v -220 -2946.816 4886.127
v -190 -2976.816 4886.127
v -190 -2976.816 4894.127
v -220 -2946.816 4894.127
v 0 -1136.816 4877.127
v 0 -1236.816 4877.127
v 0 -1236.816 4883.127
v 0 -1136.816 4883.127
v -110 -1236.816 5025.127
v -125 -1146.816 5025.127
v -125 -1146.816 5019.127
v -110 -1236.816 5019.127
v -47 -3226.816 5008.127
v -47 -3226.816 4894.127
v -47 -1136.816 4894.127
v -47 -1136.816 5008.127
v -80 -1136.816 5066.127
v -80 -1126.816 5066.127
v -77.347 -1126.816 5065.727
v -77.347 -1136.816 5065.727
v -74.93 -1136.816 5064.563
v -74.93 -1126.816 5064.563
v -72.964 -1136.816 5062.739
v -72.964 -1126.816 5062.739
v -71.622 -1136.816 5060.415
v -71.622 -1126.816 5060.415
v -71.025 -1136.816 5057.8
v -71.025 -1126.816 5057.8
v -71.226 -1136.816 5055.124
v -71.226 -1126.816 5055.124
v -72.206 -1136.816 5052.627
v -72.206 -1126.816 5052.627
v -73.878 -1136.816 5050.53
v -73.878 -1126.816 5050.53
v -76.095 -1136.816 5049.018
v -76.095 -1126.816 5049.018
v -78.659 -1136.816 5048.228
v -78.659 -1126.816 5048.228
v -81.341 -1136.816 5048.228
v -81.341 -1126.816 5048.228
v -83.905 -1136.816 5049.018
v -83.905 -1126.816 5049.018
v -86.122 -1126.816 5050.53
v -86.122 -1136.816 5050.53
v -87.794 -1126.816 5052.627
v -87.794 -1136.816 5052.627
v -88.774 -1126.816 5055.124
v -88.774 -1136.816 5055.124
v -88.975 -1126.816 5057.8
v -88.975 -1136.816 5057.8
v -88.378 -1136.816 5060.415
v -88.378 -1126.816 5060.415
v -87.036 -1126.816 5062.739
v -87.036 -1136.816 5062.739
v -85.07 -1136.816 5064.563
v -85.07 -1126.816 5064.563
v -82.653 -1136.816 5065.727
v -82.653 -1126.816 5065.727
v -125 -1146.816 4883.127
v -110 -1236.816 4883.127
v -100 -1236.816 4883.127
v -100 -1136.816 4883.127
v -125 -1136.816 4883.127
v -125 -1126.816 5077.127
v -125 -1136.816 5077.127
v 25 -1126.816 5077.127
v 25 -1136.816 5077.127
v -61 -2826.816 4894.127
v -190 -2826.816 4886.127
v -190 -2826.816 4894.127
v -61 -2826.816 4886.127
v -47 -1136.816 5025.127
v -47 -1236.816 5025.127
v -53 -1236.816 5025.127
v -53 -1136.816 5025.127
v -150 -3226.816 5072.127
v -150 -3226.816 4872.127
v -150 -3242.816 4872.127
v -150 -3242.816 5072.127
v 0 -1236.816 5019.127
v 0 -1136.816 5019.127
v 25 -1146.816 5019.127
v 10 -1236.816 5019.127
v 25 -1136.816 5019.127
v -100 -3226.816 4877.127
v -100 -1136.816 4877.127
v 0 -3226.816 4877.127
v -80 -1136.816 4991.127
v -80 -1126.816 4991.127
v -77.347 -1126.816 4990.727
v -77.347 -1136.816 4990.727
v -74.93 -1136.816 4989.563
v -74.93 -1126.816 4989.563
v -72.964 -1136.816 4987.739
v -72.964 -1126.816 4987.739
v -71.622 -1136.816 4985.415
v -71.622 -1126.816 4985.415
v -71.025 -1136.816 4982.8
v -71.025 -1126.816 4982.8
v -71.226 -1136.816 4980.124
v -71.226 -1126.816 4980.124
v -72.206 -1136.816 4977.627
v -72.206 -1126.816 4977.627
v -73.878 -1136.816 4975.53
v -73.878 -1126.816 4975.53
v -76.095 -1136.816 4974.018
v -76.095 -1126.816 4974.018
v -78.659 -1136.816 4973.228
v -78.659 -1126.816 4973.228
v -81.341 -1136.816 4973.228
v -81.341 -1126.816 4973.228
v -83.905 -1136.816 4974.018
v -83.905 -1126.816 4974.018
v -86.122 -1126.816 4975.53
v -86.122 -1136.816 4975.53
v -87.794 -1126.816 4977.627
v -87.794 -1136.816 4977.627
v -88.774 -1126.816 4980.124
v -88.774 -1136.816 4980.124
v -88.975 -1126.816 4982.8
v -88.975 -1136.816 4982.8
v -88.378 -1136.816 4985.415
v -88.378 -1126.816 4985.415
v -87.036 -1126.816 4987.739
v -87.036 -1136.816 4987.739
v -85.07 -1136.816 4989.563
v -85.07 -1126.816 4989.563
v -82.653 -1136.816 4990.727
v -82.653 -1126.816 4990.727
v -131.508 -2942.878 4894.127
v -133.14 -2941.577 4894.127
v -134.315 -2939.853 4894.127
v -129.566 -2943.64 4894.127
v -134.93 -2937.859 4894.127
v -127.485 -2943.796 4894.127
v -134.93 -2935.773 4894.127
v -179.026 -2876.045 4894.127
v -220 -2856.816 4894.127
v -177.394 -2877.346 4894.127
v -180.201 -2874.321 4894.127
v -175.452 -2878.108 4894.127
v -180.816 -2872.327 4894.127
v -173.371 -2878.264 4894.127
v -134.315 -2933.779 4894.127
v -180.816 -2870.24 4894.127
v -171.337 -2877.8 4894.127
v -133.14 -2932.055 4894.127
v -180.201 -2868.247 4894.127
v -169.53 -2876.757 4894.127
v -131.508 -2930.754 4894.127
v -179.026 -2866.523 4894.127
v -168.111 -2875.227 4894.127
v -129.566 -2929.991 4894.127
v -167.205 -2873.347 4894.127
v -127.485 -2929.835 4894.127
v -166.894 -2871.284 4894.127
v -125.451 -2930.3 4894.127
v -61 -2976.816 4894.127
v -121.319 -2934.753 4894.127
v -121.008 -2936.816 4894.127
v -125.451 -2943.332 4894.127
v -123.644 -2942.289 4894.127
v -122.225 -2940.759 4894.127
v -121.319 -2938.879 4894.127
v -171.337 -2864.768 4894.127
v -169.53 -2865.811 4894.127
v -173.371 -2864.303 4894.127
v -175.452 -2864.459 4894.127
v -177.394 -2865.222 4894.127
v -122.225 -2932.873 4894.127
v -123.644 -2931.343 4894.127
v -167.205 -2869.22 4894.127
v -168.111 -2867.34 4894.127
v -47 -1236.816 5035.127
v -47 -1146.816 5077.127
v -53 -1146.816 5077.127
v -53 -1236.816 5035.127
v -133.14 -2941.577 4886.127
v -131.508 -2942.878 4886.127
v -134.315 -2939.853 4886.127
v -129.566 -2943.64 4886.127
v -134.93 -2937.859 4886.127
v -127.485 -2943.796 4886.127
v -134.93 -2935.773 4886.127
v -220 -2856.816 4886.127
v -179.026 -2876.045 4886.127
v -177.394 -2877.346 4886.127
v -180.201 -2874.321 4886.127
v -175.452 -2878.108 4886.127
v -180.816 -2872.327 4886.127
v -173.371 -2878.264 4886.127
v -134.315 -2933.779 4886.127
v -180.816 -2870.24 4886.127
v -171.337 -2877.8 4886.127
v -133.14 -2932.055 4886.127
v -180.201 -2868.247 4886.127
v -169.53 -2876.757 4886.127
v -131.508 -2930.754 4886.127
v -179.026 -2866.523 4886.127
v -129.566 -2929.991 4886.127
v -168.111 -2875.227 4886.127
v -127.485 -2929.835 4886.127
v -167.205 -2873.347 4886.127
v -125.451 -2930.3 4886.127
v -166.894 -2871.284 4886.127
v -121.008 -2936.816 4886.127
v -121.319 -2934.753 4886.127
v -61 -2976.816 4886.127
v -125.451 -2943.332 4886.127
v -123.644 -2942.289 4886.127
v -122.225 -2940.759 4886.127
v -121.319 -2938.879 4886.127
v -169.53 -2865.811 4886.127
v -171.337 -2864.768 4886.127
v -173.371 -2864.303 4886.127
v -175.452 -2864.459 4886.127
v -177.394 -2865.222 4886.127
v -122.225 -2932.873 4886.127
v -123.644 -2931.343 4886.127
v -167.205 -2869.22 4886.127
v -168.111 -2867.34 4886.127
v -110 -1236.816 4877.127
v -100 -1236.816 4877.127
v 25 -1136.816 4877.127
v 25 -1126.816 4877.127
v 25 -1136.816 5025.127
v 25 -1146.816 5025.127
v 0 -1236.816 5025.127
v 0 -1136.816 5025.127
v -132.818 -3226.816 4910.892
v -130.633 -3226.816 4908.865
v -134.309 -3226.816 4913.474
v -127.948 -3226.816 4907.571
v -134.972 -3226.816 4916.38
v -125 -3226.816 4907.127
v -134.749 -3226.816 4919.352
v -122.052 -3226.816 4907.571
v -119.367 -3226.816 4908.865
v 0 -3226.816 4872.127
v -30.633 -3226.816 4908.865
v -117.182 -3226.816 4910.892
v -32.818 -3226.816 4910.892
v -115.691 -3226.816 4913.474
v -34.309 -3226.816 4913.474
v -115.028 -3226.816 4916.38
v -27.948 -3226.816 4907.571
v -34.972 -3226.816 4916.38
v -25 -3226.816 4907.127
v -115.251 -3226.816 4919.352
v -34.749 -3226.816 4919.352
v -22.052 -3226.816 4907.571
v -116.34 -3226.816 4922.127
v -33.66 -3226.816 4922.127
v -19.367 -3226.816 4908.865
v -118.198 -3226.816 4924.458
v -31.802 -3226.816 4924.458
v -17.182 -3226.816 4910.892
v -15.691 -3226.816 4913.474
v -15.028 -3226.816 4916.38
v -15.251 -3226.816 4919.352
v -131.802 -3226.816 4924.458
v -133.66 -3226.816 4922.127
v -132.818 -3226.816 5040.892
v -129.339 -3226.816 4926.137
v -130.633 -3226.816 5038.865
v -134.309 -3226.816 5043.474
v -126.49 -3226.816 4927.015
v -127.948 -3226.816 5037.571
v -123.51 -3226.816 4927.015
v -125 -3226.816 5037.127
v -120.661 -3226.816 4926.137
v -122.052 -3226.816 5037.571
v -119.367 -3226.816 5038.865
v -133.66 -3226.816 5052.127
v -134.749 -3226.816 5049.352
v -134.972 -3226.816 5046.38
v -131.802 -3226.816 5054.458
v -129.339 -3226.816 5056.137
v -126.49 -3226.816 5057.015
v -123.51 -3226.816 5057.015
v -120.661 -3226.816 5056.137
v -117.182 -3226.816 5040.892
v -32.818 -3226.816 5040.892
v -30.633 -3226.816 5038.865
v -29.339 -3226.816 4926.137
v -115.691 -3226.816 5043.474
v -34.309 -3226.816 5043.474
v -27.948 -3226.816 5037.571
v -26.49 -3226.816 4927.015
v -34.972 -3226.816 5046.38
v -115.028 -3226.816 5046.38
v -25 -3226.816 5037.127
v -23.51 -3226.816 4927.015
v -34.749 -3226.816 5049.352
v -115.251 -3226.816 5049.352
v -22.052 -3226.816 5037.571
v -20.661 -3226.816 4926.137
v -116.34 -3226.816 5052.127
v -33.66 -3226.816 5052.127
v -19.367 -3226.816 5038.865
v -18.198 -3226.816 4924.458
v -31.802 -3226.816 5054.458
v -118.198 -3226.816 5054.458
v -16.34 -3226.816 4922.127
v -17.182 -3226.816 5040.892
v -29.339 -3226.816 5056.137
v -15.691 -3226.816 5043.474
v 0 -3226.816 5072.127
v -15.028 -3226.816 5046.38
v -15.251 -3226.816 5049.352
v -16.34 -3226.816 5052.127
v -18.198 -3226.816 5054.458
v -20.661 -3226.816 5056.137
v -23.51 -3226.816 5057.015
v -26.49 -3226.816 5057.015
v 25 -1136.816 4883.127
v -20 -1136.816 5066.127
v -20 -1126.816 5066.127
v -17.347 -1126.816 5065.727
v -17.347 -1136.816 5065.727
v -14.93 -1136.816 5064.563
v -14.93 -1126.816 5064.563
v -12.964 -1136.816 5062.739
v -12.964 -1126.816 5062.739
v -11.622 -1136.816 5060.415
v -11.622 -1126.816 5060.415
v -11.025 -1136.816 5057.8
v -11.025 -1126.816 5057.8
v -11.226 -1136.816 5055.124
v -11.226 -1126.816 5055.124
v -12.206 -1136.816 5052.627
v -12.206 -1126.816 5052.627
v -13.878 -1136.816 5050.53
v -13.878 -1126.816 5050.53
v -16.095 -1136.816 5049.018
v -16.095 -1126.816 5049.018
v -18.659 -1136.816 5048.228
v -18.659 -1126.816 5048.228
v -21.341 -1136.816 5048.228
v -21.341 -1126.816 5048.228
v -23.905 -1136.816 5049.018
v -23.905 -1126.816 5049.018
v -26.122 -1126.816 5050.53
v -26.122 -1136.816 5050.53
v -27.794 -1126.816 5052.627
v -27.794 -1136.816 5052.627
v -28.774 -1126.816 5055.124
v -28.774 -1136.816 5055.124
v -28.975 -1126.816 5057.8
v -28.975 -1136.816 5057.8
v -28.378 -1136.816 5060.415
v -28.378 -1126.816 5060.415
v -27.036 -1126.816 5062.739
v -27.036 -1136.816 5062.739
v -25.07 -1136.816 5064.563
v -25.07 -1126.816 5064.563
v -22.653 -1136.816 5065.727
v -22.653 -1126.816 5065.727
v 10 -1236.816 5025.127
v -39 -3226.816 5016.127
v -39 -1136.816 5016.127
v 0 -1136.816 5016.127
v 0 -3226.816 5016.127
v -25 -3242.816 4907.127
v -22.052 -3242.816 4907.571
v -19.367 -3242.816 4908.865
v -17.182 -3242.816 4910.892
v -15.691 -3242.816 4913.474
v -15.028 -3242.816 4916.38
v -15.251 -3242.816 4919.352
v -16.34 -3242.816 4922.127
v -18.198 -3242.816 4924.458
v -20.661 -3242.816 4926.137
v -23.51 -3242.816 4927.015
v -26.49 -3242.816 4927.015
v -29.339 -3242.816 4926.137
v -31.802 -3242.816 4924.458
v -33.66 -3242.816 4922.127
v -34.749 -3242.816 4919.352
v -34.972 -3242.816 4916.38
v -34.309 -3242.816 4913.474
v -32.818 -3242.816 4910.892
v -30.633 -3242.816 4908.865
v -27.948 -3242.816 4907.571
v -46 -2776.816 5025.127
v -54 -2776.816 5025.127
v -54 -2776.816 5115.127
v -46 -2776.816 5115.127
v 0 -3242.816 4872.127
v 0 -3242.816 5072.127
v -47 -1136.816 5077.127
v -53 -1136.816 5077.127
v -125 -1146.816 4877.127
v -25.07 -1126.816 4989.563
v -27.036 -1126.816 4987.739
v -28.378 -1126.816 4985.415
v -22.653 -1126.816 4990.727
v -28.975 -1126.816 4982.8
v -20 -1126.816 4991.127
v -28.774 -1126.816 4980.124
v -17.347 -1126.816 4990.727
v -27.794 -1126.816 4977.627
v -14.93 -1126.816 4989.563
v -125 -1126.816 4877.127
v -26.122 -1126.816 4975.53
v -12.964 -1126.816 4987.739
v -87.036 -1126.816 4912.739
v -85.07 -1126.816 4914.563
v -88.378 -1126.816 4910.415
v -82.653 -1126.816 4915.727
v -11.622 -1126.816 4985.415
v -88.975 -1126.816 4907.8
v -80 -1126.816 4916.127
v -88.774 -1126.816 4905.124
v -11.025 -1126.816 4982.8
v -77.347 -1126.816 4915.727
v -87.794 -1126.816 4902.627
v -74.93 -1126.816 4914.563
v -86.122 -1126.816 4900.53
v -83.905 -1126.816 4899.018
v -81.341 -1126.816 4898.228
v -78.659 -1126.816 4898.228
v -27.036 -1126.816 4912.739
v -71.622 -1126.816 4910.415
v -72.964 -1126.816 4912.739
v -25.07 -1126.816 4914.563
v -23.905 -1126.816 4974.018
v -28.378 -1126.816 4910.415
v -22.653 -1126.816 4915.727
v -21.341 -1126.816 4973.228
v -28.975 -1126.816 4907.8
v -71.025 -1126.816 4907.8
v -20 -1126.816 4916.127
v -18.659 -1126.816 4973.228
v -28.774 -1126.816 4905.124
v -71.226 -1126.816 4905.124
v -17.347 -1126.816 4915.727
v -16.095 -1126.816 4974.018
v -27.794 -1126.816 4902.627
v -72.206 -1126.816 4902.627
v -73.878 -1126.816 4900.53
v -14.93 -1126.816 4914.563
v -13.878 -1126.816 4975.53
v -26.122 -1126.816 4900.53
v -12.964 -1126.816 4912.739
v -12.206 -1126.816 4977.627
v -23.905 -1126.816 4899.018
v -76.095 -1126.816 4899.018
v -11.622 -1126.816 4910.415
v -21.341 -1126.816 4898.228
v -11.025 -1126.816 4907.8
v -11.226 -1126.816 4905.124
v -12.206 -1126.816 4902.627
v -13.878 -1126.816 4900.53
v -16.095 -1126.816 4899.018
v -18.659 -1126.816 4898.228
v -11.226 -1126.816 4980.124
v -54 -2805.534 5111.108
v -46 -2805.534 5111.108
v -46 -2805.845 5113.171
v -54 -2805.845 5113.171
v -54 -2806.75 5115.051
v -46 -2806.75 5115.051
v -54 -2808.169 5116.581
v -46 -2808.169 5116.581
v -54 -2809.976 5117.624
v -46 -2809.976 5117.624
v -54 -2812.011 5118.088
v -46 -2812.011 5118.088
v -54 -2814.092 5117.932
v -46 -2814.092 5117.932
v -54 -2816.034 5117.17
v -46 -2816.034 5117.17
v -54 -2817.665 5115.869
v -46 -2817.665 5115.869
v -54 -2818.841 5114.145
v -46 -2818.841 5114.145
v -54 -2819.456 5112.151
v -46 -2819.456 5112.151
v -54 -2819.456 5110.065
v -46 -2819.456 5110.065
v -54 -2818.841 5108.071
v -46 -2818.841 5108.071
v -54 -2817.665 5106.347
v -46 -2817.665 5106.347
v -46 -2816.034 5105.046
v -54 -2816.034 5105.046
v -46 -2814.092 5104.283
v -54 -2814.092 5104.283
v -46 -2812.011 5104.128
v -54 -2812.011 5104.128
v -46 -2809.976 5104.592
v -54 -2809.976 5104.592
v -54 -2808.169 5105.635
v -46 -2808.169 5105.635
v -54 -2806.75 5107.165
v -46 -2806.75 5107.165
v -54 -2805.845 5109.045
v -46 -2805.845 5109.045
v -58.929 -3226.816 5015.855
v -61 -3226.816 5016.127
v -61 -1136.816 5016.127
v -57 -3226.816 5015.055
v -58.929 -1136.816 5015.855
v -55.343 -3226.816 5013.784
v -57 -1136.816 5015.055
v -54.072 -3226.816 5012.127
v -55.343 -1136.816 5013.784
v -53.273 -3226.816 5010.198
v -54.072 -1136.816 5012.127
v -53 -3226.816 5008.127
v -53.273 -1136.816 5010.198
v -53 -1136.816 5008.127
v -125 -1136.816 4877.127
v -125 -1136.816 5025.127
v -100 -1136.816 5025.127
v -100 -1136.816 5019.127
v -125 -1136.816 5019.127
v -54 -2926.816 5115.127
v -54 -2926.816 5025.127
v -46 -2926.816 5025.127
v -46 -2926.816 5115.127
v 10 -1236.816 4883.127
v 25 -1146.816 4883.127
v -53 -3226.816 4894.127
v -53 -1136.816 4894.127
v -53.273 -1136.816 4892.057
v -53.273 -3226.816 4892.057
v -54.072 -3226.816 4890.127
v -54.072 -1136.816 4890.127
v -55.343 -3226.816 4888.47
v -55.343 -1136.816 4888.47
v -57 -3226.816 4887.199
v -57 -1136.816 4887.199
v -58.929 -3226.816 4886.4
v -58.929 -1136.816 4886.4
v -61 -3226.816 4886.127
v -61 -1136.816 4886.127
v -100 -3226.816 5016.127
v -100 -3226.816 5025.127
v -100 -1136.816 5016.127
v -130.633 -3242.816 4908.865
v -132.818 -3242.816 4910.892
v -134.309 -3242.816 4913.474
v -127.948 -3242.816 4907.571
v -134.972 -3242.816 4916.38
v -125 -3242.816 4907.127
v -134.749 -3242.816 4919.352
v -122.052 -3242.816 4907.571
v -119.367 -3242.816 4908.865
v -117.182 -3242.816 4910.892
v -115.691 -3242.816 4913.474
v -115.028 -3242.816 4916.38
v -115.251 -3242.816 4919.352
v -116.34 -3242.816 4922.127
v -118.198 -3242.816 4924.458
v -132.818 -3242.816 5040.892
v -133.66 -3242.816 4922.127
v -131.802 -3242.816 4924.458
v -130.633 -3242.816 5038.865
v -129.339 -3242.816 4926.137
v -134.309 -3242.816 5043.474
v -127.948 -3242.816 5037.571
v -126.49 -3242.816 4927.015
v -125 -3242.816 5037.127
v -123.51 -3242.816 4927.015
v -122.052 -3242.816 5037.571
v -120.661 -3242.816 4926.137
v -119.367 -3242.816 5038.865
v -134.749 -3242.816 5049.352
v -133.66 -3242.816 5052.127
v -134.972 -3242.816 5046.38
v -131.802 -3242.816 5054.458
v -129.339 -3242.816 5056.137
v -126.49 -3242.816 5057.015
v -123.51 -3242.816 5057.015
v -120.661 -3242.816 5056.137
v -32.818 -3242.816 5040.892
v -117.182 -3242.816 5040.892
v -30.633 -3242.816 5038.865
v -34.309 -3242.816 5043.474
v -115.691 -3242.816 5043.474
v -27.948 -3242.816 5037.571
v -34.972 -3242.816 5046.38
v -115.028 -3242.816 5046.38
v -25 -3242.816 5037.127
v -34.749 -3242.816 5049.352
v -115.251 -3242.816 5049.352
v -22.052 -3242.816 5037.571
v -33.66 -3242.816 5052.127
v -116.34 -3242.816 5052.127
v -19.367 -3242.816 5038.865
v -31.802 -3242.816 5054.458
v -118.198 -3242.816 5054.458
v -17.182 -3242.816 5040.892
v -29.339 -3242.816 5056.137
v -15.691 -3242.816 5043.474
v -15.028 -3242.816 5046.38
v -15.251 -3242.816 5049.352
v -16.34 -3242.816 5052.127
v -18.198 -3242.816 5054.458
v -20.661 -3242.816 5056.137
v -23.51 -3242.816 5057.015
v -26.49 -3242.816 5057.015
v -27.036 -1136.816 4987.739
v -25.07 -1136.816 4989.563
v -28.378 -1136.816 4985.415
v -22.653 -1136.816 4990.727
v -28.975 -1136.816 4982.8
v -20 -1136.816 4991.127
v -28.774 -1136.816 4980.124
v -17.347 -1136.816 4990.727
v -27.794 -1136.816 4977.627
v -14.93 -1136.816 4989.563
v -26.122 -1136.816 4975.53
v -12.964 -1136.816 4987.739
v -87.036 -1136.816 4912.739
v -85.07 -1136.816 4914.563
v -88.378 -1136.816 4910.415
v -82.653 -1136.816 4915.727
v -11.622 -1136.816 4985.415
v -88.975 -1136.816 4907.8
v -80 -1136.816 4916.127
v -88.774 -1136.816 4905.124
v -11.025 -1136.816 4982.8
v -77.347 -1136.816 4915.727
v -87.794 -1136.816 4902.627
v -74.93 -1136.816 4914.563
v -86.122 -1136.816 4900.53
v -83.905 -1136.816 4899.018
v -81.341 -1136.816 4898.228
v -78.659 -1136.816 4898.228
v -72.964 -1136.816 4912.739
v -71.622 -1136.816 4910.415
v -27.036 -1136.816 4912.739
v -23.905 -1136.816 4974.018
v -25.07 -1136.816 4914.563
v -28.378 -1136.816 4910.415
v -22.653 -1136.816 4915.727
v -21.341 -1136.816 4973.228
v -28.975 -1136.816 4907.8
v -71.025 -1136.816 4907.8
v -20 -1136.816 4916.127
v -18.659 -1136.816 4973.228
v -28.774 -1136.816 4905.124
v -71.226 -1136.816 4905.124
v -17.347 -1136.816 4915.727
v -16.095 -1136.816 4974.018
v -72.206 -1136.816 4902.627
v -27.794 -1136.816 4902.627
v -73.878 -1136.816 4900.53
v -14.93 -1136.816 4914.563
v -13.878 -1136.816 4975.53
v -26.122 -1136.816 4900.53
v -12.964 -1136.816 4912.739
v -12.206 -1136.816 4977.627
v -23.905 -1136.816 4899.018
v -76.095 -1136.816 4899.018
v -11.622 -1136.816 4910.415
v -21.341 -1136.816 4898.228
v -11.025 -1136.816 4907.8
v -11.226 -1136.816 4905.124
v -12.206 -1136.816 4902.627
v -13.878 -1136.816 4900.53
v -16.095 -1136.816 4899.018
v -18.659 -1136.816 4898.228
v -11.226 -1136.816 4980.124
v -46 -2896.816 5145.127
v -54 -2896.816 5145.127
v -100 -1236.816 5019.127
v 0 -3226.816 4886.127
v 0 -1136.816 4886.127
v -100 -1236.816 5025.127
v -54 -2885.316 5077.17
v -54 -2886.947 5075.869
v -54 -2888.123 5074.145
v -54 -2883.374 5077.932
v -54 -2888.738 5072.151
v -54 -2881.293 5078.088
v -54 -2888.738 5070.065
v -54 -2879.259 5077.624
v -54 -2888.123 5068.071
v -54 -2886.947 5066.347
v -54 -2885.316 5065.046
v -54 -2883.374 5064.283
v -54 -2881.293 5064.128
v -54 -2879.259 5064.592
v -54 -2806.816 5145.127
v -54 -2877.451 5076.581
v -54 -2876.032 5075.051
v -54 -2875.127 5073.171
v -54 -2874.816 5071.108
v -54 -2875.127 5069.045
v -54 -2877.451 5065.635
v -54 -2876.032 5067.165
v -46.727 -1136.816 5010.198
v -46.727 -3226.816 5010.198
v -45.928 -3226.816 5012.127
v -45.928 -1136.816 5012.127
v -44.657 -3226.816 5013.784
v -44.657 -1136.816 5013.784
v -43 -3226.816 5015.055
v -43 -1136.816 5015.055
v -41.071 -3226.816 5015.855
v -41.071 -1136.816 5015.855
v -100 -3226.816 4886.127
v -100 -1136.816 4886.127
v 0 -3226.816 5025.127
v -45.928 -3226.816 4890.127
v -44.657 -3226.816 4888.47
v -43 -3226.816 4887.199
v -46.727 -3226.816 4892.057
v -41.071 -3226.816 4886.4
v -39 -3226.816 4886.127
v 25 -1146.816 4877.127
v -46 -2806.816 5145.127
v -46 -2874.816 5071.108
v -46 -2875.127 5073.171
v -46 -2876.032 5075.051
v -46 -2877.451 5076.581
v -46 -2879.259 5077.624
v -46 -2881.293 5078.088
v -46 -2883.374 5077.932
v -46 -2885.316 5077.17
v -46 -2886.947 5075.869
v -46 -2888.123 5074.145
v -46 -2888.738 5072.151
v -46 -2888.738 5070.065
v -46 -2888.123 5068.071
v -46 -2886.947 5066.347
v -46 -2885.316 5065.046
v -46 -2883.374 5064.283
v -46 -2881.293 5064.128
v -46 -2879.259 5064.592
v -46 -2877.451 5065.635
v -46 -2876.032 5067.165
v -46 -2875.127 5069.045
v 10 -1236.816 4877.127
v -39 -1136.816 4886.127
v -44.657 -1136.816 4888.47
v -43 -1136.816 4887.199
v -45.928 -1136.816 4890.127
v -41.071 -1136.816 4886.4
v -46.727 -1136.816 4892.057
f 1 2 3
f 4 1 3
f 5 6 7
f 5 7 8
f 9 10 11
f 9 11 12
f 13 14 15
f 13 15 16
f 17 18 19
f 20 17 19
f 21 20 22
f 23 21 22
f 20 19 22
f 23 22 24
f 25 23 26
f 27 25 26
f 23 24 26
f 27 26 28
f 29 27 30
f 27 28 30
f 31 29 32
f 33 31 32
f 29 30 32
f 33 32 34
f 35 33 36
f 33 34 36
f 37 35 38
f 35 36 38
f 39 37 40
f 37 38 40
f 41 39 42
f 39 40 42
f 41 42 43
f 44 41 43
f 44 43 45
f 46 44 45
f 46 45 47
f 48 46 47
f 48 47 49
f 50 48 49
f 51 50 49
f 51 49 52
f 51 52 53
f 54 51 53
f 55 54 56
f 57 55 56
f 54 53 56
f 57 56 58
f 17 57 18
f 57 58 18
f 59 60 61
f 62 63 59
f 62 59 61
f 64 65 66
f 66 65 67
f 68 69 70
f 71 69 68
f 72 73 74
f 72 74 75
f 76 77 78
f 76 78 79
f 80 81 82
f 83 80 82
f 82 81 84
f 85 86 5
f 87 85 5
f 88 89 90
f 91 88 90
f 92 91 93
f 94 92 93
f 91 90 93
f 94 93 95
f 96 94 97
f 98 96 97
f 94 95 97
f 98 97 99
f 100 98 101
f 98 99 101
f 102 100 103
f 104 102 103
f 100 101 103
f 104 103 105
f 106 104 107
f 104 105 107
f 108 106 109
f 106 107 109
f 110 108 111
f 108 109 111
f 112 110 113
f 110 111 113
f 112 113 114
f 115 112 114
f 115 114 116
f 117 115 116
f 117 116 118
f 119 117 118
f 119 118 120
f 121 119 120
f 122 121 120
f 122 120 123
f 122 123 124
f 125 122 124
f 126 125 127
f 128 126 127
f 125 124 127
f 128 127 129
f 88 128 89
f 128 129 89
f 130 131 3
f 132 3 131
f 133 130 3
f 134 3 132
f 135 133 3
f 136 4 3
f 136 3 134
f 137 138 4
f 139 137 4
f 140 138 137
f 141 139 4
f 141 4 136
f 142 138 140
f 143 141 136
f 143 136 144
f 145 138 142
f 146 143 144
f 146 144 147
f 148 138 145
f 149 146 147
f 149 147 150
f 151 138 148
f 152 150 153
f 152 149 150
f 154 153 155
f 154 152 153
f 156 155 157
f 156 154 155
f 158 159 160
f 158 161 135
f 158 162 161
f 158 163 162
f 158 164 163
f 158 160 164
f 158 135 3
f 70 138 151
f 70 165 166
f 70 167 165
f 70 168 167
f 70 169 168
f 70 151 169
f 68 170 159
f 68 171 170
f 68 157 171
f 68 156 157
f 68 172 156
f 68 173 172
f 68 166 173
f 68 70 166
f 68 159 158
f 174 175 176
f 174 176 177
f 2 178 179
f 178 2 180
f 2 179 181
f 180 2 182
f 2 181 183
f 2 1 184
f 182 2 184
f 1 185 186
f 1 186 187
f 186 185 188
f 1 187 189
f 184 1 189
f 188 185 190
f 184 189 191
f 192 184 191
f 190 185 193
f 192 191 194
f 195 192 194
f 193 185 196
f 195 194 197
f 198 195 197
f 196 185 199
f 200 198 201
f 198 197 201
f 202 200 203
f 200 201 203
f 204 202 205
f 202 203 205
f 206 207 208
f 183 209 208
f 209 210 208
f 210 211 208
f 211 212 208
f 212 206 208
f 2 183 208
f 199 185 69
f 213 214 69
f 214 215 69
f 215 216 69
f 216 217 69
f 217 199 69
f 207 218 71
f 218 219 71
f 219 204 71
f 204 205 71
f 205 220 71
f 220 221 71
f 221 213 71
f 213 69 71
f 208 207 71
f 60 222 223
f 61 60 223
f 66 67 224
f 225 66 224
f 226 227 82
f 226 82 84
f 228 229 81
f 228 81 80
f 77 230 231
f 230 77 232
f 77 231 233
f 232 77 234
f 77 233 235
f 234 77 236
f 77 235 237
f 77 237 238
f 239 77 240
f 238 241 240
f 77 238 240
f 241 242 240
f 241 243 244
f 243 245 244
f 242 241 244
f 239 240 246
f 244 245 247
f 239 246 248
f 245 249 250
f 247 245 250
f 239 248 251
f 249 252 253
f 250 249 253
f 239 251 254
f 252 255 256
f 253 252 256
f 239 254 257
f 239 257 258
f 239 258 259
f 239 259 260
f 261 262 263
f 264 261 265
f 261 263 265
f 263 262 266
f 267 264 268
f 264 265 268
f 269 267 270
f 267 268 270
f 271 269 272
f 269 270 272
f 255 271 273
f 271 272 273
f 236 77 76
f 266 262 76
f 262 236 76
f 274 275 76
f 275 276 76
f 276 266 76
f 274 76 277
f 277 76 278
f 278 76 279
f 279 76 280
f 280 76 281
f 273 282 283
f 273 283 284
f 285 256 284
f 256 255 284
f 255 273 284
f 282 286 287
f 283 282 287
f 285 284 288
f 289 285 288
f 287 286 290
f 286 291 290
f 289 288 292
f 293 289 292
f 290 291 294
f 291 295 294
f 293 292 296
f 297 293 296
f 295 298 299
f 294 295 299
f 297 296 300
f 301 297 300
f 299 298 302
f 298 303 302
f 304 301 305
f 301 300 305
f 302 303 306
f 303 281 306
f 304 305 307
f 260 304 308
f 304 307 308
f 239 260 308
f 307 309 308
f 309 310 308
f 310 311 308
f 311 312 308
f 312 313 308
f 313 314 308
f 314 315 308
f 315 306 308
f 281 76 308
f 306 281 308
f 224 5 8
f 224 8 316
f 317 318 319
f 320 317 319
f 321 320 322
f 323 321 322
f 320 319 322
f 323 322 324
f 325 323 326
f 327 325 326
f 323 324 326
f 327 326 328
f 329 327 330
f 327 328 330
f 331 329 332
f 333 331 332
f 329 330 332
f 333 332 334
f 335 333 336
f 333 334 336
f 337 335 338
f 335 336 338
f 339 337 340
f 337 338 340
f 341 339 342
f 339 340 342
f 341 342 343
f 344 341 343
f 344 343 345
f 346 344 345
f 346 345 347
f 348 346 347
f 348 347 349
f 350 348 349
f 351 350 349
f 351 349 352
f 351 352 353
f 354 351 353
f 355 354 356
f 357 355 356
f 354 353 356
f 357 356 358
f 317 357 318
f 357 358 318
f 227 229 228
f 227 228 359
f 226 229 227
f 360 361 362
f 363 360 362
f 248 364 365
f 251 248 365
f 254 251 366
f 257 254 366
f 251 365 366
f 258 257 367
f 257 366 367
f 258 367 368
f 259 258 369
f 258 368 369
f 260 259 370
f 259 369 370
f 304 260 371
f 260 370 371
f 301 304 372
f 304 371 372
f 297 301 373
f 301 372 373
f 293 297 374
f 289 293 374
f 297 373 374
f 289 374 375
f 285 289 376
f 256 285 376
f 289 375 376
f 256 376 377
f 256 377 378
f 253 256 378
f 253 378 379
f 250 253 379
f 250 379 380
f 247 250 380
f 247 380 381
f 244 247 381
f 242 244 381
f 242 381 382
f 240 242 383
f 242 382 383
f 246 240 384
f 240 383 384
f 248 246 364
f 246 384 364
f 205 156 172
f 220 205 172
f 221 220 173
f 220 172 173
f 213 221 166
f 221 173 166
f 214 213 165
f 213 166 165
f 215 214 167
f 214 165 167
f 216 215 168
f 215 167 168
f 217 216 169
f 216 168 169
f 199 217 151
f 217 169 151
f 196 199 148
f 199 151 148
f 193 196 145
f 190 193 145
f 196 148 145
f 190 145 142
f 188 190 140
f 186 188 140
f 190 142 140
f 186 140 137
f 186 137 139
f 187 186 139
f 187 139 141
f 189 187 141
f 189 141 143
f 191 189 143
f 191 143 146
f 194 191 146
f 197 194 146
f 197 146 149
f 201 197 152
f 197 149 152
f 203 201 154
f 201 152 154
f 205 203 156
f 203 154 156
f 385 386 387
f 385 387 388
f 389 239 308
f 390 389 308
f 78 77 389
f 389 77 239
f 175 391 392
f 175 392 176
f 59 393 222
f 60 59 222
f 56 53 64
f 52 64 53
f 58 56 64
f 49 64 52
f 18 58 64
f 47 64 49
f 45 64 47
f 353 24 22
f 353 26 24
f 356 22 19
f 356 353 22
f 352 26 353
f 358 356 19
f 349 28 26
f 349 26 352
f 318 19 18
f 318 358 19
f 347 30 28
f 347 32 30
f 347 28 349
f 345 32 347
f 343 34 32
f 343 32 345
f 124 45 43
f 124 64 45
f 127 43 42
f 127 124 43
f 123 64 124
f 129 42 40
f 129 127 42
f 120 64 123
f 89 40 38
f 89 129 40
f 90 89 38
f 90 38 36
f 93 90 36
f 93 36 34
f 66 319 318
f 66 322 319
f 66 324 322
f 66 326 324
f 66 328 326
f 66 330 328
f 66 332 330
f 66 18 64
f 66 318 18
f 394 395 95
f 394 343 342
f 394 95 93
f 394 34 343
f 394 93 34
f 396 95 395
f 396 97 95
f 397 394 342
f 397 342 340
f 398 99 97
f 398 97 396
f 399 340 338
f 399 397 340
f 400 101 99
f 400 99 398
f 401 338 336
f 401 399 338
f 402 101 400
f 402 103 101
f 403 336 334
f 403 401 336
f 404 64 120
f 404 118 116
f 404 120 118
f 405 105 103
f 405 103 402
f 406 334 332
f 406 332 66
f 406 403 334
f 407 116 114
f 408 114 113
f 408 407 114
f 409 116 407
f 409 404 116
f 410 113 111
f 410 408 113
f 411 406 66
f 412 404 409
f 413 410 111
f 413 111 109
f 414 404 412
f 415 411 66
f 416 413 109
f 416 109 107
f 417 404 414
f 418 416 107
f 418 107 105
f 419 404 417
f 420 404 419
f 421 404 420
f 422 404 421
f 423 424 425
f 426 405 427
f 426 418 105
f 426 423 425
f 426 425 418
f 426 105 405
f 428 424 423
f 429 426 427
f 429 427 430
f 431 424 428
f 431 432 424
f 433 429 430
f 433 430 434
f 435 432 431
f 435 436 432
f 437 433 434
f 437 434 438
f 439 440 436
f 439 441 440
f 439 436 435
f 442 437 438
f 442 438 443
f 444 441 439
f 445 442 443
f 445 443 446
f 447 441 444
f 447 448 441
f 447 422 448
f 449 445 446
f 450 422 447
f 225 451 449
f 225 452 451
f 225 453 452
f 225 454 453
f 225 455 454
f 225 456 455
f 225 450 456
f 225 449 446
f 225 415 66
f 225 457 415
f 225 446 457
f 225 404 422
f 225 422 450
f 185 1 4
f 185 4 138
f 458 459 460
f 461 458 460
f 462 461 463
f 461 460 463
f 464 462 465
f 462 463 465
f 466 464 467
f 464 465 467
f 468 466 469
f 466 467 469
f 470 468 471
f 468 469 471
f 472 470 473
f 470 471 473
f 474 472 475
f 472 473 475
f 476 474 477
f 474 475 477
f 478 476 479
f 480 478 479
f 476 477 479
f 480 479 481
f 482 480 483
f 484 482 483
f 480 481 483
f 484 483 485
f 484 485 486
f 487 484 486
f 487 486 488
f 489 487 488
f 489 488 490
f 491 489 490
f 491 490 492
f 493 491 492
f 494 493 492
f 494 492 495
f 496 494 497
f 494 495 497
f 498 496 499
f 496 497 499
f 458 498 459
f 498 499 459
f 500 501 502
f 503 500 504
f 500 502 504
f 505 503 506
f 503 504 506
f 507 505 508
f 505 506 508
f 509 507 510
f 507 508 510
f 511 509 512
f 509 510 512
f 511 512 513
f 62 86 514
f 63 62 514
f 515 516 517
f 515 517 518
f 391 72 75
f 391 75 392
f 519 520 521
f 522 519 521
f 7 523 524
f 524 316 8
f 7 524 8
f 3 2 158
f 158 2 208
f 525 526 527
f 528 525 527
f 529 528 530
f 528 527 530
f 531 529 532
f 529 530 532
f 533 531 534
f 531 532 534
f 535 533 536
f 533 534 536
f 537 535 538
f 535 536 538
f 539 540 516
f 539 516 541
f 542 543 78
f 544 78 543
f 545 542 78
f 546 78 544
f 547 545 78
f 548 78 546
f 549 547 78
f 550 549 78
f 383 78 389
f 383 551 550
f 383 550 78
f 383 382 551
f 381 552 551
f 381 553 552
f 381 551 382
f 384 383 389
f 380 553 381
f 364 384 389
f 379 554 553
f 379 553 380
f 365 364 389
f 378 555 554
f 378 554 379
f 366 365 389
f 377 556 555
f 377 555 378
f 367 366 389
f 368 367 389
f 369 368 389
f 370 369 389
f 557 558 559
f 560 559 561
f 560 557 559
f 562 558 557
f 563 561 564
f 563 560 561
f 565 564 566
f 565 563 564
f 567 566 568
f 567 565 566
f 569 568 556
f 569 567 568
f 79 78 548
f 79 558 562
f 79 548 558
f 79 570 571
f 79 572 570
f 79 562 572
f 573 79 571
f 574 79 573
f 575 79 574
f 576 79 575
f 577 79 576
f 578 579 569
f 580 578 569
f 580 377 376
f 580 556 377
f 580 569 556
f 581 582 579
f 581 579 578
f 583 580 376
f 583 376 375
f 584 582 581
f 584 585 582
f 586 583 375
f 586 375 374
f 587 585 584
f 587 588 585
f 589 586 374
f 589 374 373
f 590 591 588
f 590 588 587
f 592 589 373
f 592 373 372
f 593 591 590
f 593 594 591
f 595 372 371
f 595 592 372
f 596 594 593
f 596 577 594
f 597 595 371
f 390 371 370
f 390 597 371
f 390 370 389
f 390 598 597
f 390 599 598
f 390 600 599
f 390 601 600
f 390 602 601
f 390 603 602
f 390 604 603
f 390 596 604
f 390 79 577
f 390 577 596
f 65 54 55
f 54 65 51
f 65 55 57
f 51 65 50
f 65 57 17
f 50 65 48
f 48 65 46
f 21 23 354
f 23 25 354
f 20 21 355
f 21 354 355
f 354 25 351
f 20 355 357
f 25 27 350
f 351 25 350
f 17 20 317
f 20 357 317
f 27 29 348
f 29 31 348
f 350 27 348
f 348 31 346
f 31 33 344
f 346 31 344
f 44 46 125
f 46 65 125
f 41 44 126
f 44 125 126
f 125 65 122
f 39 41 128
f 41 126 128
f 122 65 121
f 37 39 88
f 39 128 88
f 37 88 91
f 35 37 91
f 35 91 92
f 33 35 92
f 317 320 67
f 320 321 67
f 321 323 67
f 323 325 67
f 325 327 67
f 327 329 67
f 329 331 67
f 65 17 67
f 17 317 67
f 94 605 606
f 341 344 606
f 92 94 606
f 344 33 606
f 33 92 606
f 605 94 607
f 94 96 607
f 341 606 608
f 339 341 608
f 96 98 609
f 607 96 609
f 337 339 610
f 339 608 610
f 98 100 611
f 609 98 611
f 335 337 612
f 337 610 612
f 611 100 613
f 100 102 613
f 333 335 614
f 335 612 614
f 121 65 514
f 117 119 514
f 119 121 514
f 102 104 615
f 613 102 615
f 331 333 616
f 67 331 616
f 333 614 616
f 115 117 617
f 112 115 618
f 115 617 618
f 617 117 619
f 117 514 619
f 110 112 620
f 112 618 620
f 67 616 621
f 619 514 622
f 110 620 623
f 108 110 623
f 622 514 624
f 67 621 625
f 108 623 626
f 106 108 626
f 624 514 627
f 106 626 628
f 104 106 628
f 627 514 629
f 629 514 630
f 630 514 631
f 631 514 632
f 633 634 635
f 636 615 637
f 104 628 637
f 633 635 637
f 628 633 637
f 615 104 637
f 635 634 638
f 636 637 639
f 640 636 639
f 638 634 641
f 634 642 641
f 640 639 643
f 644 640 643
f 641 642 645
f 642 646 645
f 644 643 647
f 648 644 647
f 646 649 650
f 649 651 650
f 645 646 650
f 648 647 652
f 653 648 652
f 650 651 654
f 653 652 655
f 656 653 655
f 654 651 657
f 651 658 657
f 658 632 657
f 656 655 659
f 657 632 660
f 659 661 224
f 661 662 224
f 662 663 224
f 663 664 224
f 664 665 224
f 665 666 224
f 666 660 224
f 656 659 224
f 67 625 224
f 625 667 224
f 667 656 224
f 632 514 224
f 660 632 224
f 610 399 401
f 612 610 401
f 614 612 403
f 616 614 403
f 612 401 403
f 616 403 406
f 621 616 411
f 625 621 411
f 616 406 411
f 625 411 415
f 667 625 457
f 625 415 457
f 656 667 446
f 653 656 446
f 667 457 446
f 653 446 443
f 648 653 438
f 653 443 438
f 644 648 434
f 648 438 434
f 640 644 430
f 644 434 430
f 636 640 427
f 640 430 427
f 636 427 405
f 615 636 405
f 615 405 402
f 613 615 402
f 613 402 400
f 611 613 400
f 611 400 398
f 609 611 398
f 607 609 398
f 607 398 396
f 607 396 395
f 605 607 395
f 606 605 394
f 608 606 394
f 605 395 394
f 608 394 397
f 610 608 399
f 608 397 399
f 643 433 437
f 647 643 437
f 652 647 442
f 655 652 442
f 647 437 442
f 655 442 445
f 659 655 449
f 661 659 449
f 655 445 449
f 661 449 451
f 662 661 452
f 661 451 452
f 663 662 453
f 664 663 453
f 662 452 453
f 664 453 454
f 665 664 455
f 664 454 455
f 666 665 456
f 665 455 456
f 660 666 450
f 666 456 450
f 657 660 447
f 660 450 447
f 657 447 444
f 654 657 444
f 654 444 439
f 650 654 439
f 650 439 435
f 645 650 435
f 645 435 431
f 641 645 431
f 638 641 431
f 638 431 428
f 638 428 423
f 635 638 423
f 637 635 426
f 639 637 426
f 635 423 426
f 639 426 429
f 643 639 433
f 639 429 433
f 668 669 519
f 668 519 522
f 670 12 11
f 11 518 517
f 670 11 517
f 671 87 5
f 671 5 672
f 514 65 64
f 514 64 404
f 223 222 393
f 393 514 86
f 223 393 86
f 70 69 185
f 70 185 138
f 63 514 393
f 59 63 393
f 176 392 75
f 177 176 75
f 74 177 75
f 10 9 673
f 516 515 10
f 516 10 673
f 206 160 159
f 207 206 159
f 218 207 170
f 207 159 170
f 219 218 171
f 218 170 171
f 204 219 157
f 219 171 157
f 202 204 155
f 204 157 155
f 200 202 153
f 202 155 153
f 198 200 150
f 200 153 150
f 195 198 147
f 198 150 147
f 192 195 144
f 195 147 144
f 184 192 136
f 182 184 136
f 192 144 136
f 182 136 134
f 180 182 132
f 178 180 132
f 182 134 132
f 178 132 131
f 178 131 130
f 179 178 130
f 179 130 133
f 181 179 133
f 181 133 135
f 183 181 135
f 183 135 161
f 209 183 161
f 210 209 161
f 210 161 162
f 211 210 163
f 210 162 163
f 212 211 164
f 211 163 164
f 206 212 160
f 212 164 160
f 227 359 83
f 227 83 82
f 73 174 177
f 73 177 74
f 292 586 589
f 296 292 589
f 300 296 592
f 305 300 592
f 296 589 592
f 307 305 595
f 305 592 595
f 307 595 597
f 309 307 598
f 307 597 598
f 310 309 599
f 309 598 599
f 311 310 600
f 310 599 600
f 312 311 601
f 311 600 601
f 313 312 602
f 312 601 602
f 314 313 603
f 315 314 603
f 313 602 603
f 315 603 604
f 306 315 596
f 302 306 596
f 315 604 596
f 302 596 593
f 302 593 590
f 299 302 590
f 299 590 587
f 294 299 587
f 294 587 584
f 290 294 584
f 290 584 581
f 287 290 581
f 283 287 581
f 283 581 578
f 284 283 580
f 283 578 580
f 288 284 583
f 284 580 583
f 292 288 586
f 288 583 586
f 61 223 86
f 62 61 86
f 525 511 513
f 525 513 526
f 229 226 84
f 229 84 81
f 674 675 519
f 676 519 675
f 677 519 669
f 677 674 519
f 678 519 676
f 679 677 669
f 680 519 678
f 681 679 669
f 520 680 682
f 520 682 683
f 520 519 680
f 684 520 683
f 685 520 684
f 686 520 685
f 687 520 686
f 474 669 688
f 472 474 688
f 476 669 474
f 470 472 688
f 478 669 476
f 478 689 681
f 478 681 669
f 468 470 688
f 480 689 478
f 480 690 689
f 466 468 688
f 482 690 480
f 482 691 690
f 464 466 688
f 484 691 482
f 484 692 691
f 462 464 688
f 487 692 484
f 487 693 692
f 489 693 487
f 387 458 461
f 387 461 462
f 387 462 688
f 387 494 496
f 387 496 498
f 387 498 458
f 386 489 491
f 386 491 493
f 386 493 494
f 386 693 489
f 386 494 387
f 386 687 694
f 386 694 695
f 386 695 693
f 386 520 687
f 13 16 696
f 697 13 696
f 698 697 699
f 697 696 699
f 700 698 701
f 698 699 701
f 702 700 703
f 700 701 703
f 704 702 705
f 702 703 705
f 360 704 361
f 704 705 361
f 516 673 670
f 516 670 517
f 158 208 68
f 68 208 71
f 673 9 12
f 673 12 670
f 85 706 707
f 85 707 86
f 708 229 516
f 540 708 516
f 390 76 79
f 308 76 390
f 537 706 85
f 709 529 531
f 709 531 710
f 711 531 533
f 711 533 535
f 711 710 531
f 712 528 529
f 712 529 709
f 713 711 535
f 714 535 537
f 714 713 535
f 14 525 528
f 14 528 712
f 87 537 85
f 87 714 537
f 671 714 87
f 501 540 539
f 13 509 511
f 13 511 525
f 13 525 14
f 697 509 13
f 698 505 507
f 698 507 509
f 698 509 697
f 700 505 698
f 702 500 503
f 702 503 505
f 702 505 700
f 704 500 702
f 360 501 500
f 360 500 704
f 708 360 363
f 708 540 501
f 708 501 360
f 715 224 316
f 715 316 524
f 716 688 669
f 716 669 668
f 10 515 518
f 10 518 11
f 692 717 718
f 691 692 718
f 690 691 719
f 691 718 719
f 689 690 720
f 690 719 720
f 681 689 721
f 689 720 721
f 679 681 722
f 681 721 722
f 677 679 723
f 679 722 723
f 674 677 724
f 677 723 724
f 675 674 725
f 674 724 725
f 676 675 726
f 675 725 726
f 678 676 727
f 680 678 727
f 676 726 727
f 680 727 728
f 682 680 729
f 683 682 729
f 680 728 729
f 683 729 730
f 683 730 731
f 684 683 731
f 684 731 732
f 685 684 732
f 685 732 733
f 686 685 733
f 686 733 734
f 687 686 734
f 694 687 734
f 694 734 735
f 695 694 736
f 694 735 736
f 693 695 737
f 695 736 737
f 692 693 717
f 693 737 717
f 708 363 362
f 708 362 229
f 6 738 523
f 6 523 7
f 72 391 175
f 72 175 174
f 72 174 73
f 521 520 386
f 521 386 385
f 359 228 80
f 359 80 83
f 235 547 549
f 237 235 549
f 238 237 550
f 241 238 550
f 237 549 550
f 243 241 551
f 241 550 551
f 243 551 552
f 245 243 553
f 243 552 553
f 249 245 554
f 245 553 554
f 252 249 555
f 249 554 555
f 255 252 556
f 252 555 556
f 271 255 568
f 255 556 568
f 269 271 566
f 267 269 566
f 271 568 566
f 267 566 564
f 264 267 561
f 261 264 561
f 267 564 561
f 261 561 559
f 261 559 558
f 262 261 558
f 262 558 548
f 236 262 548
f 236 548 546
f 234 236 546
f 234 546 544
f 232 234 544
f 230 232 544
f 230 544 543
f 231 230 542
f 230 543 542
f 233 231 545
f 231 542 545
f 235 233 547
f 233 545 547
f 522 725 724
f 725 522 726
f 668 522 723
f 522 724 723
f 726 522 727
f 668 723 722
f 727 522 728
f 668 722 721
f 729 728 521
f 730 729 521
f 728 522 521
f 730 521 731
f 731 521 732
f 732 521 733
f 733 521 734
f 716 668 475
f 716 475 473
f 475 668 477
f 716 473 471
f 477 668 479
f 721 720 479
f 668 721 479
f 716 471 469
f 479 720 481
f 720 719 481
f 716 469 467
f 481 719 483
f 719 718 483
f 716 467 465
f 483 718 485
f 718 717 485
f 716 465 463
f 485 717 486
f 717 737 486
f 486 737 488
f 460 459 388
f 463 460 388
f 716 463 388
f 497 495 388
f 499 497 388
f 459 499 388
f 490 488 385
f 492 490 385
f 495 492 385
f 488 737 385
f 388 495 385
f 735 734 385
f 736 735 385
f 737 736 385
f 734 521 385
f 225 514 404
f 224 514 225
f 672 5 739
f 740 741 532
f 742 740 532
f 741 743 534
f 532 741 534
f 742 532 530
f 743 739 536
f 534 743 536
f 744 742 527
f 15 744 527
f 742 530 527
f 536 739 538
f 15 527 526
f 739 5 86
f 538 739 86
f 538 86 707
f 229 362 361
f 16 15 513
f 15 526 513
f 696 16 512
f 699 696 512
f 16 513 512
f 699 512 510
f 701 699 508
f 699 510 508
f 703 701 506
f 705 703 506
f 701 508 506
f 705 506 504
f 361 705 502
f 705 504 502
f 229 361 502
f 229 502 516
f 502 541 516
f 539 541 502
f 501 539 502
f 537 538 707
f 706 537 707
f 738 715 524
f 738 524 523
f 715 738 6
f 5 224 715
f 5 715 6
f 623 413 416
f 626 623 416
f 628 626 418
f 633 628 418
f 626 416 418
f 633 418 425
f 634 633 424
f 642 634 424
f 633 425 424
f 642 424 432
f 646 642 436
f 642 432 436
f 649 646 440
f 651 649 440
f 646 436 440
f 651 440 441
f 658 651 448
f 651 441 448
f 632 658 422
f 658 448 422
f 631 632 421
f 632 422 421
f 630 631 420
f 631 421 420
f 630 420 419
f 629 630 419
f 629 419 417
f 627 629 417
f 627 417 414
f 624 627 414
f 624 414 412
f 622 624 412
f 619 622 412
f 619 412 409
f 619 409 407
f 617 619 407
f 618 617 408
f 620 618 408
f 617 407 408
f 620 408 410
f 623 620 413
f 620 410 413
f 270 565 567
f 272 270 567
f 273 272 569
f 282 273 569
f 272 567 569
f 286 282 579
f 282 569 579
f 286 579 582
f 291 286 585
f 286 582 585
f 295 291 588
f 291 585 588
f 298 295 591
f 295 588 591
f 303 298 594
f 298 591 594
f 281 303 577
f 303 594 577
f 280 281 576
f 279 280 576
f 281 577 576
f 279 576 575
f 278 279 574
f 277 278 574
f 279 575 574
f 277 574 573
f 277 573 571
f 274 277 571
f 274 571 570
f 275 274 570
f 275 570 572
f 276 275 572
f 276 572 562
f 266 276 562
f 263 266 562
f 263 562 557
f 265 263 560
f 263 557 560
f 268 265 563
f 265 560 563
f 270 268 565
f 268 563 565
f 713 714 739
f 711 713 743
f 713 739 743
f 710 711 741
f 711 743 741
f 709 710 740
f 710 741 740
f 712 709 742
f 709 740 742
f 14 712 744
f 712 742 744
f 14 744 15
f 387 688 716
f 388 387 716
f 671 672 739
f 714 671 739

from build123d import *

# Parameters (mm, degrees)
H_HM150_100_1_DEPTH = 2100
SKETCH_12_W         = 150
SKETCH_12_H         = 200
EXTRUDE_1_DEPTH     = 16
SKETCH_13_W         = 148
SKETCH_13_H         = 10
CUT_EXTRUDE_1_DEPTH = 100
SKETCH_14_W         = 150
SKETCH_14_H         = 200
EXTRUDE_2_DEPTH     = 10
SKETCH_16_R         = 9
CUT_EXTRUDE_2_DEPTH = 10
EXTRUDE_3_DEPTH     = 6
EXTRUDE_3_2_DEPTH   = 6
EXTRUDE_4_DEPTH     = 6
EXTRUDE_4_2_DEPTH   = 6
EXTRUDE_5_DEPTH     = 6
SKETCH_20_W         = 8
SKETCH_20_H         = 150
EXTRUDE_6_DEPTH     = 120
CHAMFER_1_SIZE      = 30
SKETCH_21_R         = 7
CUT_EXTRUDE_3_DEPTH = 8
SKETCH_22_W         = 159
SKETCH_22_H         = 150
EXTRUDE_7_DEPTH     = 8
CHAMFER_2_SIZE      = 30
SKETCH_23_R         = 7
CUT_EXTRUDE_4_DEPTH = 8
SKETCH_24_R         = 10
CUT_EXTRUDE_5_DEPTH = 16


with BuildPart() as part:
    # 草图11 → H型钢 HM150×100(1) (new body)
    with BuildSketch(Plane(origin=(-50, -1126.815903712, 4951.12717578), x_dir=(1, 0, 0), z_dir=(0, -1, 0))):
        with BuildLine():
            Line((-50, -74), (50, -74))
            Line((50, -74), (50, -65))
            Line((50, -65), (11, -65))
            ThreePointArc((11, -65), (5.343145751, -62.656854249), (3, -57))
            Line((3, -57), (3, 57))
            ThreePointArc((3, 57), (5.343145751, 62.656854249), (11, 65))
            Line((11, 65), (50, 65))
            Line((50, 65), (50, 74))
            Line((50, 74), (-50, 74))
            Line((-50, 74), (-50, 65))
            Line((-50, 65), (-11, 65))
            ThreePointArc((-11, 65), (-5.343145751, 62.656854249), (-3, 57))
            Line((-3, 57), (-3, -57))
            ThreePointArc((-3, -57), (-5.343145751, -62.656854249), (-11, -65))
            Line((-11, -65), (-50, -65))
            Line((-50, -65), (-50, -74))
        make_face()
    extrude(amount=H_HM150_100_1_DEPTH)

    # 草图13 → 切除-拉伸1 (cut)
    with BuildSketch(Plane.ZY.offset(100)):
        with Locations((4951.12717578, -1131.815903712)):
            Rectangle(SKETCH_13_W, SKETCH_13_H)
    extrude(amount=-CUT_EXTRUDE_1_DEPTH, mode=Mode.SUBTRACT)


with BuildPart() as body_2:
    # 草图12 → 凸台-拉伸1 (new body)
    with BuildSketch(Plane.XZ.offset(3226.815903712)):
        with Locations((-75, 4972.12717578)):
            Rectangle(SKETCH_12_W, SKETCH_12_H)
    extrude(amount=EXTRUDE_1_DEPTH)

    # 草图24 → 切除-拉伸5 (cut)
    with BuildSketch(Plane.XZ.offset(3242.815903712)):
        with Locations(Location((-125, 5047.12717578, 0), (0, 0, 270))):
            Circle(SKETCH_24_R)
        with Locations(Location((-25, 5047.12717578, 0), (0, 0, 270))):
            Circle(SKETCH_24_R)
        with Locations(Location((-125, 4917.12717578, 0), (0, 0, 270))):
            Circle(SKETCH_24_R)
        with Locations(Location((-25, 4917.12717578, 0), (0, 0, 270))):
            Circle(SKETCH_24_R)
    extrude(amount=-CUT_EXTRUDE_5_DEPTH, mode=Mode.SUBTRACT)


with BuildPart() as body_3:
    # 草图14 → 凸台-拉伸2 (new body)
    with BuildSketch(Plane(origin=(0, -1136.815903712, 0), x_dir=(1, 0, 0), z_dir=(0, 1, 0))):
        with Locations((-50, -4977.12717578)):
            Rectangle(SKETCH_14_W, SKETCH_14_H)
    extrude(amount=EXTRUDE_2_DEPTH)

    # 草图16 → 切除-拉伸2 (cut)
    with BuildSketch(Plane(origin=(0, -1126.815903712, 0), x_dir=(1, 0, 0), z_dir=(0, 1, 0))):
        with Locations(Location((-20, -4907.12717578, 0), (0, 0, 270))):
            Circle(SKETCH_16_R)
        with Locations(Location((-20, -4982.12717578, 0), (0, 0, 270))):
            Circle(SKETCH_16_R)
        with Locations(Location((-20, -5057.12717578, 0), (0, 0, 270))):
            Circle(SKETCH_16_R)
        with Locations(Location((-80, -4907.12717578, 0), (0, 0, 270))):
            Circle(SKETCH_16_R)
        with Locations(Location((-80, -4982.12717578, 0), (0, 0, 270))):
            Circle(SKETCH_16_R)
        with Locations(Location((-80, -5057.12717578, 0), (0, 0, 270))):
            Circle(SKETCH_16_R)
    extrude(amount=-CUT_EXTRUDE_2_DEPTH, mode=Mode.SUBTRACT)


with BuildPart() as body_4:
    # 草图17 → 凸台-拉伸3 (new body)
    with BuildSketch(Plane(origin=(0, 0, 4877.12717578), x_dir=(-1, 0, 0), z_dir=(0, 0, -1))):
        Polygon((0, -1136.815903712), (-25, -1136.815903712), (-25, -1146.815903712), (-10, -1236.815903712), (0, -1236.815903712), align=None)
    extrude(amount=-EXTRUDE_3_DEPTH)


with BuildPart() as body_5:
    # 草图17 → Extrude 3 2 (new body)
    with BuildSketch(Plane(origin=(0, 0, 4877.12717578), x_dir=(-1, 0, 0), z_dir=(0, 0, -1))):
        Polygon((100, -1136.815903712), (125, -1136.815903712), (125, -1146.815903712), (110, -1236.815903712), (100, -1236.815903712), align=None)
    extrude(amount=-EXTRUDE_3_2_DEPTH)


with BuildPart() as body_6:
    # 草图18 → 凸台-拉伸4 (new body)
    with BuildSketch(Plane.XY.offset(5025.12717578)):
        Polygon((-100, -1236.815903712), (-100, -1136.815903712), (-125, -1136.815903712), (-125, -1146.815903712), (-110, -1236.815903712), align=None)
    extrude(amount=-EXTRUDE_4_DEPTH)


with BuildPart() as body_7:
    # 草图18 → Extrude 4 2 (new body)
    with BuildSketch(Plane.XY.offset(5025.12717578)):
        Polygon((0, -1136.815903712), (0, -1236.815903712), (10, -1236.815903712), (25, -1146.815903712), (25, -1136.815903712), align=None)
    extrude(amount=-EXTRUDE_4_2_DEPTH)


with BuildPart() as body_8:
    # 草图19 → 凸台-拉伸5 (new body)
    with BuildSketch(Plane(origin=(-47, 0, 0), x_dir=(0, 0, -1), z_dir=(1, 0, 0))):
        Polygon((-5025.12717578, -1136.815903712), (-5077.12717578, -1136.815903712), (-5077.12717578, -1146.815903712), (-5035.12717578, -1236.815903712), (-5025.12717578, -1236.815903712), align=None)
    extrude(amount=-EXTRUDE_5_DEPTH)


with BuildPart() as body_9:
    # 草图20 → 凸台-拉伸6 (new body)
    with BuildSketch(Plane.XY.offset(5025.12717578)):
        with Locations((-50, -2851.815903712)):
            Rectangle(SKETCH_20_W, SKETCH_20_H)
    extrude(amount=EXTRUDE_6_DEPTH)

    # 倒角1
    chamfer_1_edges = [body_9.edges().sort_by_distance(p)[0] for p in [
        (-50, -2776.815903712, 5145.12717578),
        (-50, -2926.815903712, 5145.12717578),
    ]]
    chamfer(chamfer_1_edges, length=CHAMFER_1_SIZE)

    # 草图21 → 切除-拉伸3 (cut)
    with BuildSketch(Plane(origin=(-46, 0, 0), x_dir=(0, 0, -1), z_dir=(1, 0, 0))):
        with Locations(Location((-5071.107937894, -2881.815903712, 0), (0, 0, 90))):
            Circle(SKETCH_21_R)
        with Locations(Location((-5111.107937894, -2812.533871409, 0), (0, 0, 90))):
            Circle(SKETCH_21_R)
    extrude(amount=-CUT_EXTRUDE_3_DEPTH, mode=Mode.SUBTRACT)


with BuildPart() as body_10:
    # 草图22 → 凸台-拉伸7 (new body)
    with BuildSketch(Plane.XY.offset(4886.12717578)):
        with Locations((-140.5, -2901.815903712)):
            Rectangle(SKETCH_22_W, SKETCH_22_H)
    extrude(amount=EXTRUDE_7_DEPTH)

    # 倒角2
    chamfer_2_edges = [body_10.edges().sort_by_distance(p)[0] for p in [
        (-220, -2976.815903712, 4890.12717578),
        (-220, -2826.815903712, 4890.12717578),
    ]]
    chamfer(chamfer_2_edges, length=CHAMFER_2_SIZE)

    # 草图23 → 切除-拉伸4 (cut)
    with BuildSketch(Plane.XY.offset(4894.12717578)):
        with Locations((-128.008301528, -2936.815903712)):
            Circle(SKETCH_23_R)
        with Locations((-173.894416436, -2871.283740168)):
            Circle(SKETCH_23_R)
    extrude(amount=-CUT_EXTRUDE_4_DEPTH, mode=Mode.SUBTRACT)


solid = Compound([part.part, body_2.part, body_3.part, body_4.part, body_5.part, body_6.part, body_7.part, body_8.part, body_9.part, body_10.part])
